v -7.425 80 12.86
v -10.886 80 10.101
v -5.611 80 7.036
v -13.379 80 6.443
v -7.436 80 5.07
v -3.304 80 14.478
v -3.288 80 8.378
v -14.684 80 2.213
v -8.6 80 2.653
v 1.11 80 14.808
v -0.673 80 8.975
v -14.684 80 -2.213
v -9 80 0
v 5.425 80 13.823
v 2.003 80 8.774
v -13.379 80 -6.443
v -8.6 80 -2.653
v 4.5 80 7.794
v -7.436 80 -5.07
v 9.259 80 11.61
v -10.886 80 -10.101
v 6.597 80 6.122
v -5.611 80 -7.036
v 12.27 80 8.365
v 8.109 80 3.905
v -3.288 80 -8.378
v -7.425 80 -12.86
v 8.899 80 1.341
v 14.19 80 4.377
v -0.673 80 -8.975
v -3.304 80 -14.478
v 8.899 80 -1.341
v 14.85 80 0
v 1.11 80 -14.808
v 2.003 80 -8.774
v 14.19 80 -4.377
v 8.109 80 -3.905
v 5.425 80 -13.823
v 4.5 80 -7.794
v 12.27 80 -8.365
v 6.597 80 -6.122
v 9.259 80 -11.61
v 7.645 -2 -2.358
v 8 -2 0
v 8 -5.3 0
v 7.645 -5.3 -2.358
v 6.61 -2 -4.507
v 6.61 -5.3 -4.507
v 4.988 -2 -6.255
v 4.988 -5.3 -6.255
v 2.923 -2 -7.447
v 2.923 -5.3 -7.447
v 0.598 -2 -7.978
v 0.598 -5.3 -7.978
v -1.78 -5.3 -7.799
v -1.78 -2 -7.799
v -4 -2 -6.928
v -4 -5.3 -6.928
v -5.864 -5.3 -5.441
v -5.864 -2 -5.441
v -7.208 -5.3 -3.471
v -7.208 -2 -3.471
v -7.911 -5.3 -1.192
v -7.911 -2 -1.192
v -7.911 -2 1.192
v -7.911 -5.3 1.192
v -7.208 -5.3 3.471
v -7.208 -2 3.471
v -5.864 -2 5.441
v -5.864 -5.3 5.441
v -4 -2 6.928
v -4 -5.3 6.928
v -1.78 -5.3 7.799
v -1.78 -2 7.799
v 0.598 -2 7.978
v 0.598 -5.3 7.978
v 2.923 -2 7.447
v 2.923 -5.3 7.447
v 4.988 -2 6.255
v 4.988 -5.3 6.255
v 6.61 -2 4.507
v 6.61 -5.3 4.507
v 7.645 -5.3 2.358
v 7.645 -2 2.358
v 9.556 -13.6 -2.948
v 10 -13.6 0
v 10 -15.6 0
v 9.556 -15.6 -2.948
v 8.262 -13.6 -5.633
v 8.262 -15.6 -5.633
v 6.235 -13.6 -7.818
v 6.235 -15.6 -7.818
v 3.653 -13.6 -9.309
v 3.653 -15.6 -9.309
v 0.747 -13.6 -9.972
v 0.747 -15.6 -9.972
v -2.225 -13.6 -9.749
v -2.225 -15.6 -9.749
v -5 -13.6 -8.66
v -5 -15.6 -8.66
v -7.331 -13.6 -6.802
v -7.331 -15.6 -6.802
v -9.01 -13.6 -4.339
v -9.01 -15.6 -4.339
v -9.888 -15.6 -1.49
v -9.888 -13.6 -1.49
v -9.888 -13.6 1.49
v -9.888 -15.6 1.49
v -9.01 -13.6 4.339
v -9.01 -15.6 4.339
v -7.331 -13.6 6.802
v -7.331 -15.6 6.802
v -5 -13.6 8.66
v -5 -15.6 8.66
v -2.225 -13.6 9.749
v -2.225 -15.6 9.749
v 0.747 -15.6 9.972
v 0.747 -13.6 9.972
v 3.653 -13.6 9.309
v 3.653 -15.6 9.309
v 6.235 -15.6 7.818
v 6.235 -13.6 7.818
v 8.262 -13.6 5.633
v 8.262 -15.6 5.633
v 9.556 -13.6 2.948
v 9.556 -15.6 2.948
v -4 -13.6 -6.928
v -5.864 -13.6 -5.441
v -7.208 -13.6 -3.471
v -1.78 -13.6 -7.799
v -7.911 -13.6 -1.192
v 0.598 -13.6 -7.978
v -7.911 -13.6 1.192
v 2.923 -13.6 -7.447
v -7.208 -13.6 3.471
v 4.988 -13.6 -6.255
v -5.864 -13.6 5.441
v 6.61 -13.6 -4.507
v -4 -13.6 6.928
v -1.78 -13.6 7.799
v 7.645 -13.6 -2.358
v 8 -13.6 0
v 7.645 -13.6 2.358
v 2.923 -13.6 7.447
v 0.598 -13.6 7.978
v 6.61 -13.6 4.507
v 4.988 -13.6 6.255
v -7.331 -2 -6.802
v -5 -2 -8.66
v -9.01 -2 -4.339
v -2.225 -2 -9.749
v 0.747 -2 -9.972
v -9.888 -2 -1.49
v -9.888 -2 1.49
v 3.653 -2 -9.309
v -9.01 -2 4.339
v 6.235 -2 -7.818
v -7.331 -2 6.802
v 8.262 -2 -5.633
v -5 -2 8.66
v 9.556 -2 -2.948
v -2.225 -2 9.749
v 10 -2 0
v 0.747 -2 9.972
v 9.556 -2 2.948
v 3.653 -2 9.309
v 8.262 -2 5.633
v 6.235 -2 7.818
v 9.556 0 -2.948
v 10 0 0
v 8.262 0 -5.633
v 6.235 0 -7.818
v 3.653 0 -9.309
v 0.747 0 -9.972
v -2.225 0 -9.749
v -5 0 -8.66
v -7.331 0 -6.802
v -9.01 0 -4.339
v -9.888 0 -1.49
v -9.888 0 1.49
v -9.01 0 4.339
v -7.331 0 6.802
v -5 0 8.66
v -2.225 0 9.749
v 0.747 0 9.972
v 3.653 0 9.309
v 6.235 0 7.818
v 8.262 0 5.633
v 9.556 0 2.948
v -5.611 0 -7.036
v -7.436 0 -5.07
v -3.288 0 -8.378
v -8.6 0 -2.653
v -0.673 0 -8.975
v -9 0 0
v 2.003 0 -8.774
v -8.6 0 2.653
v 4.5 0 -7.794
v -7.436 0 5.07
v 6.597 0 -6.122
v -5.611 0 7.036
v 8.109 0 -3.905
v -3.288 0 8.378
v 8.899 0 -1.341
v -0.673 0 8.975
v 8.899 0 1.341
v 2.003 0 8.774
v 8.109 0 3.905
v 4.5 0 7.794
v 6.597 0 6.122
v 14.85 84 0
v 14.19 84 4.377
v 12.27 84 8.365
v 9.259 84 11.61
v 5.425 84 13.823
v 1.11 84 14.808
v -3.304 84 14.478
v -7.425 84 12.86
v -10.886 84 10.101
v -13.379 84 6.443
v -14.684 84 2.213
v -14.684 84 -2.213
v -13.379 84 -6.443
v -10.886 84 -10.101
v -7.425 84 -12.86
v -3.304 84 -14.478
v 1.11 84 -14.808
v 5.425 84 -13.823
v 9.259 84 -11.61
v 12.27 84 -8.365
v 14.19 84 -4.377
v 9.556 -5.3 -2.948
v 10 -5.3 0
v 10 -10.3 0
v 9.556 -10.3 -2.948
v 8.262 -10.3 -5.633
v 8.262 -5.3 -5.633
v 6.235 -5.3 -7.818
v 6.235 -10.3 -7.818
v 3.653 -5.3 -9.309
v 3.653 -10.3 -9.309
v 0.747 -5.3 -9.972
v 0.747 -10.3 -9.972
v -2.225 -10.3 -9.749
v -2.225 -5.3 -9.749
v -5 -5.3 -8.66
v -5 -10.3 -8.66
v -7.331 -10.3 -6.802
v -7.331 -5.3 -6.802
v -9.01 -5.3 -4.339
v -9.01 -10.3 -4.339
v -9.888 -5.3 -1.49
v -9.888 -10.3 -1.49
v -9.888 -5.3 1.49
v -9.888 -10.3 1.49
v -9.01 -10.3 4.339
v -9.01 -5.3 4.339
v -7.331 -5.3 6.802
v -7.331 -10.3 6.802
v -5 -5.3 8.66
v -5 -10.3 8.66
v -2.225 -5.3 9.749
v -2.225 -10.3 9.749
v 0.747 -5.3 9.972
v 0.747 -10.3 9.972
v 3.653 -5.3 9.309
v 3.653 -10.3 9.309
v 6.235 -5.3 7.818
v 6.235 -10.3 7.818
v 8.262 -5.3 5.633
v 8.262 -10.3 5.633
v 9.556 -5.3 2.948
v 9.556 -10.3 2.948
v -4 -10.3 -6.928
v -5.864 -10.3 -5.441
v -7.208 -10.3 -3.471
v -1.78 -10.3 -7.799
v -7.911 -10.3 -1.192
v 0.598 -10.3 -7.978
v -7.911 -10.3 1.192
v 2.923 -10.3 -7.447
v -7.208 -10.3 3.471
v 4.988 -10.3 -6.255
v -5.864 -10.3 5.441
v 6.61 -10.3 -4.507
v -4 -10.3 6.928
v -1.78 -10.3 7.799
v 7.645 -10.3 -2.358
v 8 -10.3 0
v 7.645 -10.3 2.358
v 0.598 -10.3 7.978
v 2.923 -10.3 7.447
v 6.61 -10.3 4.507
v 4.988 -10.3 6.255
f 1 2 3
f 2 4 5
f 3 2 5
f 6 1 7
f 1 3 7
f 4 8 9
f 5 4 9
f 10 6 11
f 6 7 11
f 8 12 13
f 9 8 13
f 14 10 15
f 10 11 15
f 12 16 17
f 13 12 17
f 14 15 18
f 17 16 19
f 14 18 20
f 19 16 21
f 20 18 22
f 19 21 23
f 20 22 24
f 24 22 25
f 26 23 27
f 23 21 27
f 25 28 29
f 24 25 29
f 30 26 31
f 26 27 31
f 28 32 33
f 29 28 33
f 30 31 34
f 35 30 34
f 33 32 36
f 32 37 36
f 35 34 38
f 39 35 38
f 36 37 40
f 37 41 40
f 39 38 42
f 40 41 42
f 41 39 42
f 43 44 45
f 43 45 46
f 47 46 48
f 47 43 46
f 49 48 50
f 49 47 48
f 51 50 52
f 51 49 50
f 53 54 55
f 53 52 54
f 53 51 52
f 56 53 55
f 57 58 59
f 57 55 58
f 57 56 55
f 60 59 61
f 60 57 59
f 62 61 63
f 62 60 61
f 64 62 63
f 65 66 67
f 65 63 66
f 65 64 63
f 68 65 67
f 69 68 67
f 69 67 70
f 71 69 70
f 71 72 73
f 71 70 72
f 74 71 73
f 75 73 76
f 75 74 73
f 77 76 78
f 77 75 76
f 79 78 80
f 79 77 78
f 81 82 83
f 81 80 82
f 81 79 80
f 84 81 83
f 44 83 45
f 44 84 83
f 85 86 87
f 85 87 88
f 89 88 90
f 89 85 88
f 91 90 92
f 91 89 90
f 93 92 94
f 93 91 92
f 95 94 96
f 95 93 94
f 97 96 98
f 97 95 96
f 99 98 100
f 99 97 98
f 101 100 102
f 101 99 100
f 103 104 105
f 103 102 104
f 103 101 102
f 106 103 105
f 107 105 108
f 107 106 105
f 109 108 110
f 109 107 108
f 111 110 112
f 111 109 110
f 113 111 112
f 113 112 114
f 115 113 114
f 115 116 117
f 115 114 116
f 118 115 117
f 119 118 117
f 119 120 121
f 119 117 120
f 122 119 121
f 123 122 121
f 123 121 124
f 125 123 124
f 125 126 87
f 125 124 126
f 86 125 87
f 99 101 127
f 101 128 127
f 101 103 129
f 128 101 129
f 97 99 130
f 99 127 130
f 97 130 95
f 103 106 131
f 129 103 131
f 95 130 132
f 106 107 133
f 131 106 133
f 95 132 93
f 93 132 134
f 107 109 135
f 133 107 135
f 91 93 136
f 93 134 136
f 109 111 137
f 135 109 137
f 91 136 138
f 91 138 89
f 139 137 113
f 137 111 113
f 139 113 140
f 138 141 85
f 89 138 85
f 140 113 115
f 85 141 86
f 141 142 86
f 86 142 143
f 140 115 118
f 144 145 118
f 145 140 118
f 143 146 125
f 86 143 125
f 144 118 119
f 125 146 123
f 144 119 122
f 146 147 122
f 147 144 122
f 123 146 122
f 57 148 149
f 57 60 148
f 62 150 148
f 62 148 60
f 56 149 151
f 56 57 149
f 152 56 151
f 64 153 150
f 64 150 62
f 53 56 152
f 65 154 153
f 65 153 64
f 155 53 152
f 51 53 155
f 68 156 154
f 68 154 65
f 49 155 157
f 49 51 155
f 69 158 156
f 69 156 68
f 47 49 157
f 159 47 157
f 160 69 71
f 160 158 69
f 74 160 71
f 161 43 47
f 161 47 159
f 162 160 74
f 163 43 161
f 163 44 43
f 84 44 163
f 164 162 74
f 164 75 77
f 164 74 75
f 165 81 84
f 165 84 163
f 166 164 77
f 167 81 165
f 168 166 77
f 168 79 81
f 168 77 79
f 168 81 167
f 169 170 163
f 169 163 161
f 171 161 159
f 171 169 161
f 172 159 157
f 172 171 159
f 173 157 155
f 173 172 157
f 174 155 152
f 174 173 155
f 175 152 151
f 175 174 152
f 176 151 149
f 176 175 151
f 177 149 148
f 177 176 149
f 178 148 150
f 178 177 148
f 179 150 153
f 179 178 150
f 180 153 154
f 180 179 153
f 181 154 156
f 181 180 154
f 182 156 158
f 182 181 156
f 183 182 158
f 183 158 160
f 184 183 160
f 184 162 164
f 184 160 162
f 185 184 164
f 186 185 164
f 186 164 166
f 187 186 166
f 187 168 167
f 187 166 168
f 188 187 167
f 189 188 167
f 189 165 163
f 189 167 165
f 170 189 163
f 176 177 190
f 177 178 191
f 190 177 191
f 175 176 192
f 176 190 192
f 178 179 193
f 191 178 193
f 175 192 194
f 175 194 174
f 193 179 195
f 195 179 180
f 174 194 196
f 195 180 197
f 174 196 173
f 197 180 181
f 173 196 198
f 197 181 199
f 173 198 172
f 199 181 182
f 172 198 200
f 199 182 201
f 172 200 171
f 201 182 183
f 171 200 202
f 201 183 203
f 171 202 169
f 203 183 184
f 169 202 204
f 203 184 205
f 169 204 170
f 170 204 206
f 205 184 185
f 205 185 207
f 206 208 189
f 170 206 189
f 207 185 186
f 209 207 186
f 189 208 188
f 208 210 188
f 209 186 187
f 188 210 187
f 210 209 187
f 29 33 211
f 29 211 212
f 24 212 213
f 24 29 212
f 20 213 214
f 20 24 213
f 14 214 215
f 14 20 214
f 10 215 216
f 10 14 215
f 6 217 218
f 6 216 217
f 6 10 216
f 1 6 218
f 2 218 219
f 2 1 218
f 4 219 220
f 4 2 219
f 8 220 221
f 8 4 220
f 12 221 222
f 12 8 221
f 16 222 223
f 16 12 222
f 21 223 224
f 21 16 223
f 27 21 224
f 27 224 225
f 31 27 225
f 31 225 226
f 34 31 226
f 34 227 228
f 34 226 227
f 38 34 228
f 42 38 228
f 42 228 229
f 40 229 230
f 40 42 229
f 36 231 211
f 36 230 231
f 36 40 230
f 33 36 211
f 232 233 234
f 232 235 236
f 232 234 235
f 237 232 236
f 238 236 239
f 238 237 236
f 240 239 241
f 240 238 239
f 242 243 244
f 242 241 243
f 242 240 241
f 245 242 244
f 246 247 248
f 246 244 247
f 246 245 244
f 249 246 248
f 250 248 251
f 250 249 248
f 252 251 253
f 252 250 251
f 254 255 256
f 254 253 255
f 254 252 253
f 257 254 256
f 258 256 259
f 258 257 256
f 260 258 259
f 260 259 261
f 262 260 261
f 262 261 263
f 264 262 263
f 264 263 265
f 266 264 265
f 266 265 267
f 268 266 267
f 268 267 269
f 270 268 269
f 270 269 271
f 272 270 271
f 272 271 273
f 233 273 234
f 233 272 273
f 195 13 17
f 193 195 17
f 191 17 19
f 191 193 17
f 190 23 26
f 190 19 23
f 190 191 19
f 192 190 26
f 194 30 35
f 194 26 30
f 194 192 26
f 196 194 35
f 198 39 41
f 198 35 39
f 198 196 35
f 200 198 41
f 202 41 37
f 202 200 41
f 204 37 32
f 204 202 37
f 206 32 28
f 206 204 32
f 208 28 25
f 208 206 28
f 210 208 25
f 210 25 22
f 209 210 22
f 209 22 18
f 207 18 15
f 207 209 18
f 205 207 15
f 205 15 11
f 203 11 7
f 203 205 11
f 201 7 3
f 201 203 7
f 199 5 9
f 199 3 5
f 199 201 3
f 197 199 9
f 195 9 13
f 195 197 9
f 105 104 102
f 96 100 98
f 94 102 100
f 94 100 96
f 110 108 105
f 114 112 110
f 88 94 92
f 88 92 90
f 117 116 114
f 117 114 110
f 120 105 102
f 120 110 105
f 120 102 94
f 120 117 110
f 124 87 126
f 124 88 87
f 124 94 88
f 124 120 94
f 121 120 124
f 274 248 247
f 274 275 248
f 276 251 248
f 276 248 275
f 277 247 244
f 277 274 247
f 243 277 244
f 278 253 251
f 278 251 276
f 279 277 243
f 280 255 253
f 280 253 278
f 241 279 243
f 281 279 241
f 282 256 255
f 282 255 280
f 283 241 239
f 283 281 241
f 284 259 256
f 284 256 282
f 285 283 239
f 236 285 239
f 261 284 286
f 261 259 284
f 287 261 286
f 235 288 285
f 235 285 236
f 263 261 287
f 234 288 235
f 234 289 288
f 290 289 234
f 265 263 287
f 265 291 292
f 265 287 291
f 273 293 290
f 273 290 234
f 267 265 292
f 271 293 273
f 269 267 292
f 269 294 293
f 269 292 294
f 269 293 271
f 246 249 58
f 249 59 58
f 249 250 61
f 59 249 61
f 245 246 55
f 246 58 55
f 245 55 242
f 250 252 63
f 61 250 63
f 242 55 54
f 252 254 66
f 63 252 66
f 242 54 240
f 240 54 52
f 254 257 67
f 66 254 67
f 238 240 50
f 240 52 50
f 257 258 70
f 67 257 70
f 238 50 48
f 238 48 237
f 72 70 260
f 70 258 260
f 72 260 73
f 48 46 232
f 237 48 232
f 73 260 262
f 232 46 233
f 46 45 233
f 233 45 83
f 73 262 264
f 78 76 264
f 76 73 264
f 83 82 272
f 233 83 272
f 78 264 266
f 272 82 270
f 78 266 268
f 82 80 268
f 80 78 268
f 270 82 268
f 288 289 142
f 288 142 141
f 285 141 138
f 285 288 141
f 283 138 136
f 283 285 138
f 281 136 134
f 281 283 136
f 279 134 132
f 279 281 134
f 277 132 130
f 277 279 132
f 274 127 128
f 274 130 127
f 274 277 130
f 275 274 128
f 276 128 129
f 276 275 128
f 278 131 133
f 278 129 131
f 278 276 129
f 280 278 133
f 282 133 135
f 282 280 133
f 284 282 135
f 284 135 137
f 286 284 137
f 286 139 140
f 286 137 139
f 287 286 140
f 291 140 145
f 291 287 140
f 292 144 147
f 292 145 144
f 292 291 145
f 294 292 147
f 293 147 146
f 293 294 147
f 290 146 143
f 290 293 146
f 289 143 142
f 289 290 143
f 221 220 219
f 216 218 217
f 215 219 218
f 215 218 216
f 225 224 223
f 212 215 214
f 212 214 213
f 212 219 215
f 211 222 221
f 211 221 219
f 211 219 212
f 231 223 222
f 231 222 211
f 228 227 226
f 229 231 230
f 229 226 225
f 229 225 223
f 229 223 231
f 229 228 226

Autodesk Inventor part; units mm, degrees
ref_plane "YZ Plane" through (0, 0, 0) normal (1, 0, 0) x (0, 1, 0)
ref_plane "XZ Plane" through (0, 0, 0) normal (0, 1, 0) x (-1, 0, 0)
ref_plane "XY Plane" through (0, 0, 0) normal (0, 0, 1) x (1, 0, 0)
sketch "Sketch1" plane through (0, 0, 0) normal (0, 1, 0) x (-1, 0, 0)
  circle A0 centre (0, 0) radius 9
  dimension "d0" = 18
extrude "Extrusion1" add sketch "Sketch1" along normal blind 80
sketch "Sketch2" plane through (0, 80, 0) normal (0, 1, 0) x (1, 0, 0)
  circle A0 centre (0, 0) radius 14.85
  dimension "d3" = 29.7
extrude "Extrusion2" add sketch "Sketch2" along normal blind 4
sketch "Sketch3" plane through (0, 0, 0) normal (0, -1, 0) x (1, 0, 0)
  circle A0 centre (0, 0) radius 9 projected
  circle A1 centre (0, 0) radius 10
  dimension "d6" = 20
extrude "Extrusion3" add sketch "Sketch3" along normal blind 2 contours A0 | A1
sketch "Sketch4" plane through (0, -2, 0) normal (0, -1, 0) x (1, 0, 0)
  circle A0 centre (0, 0) radius 8
  dimension "d9" = 16
extrude "Extrusion4" add sketch "Sketch4" along normal blind 3.3
sketch "Sketch5" plane through (0, -5.3, 0) normal (0, -1, 0) x (1, 0, 0)
  circle A0 centre (0, 0) radius 10
  dimension "d12" = 20
extrude "Extrusion5" add sketch "Sketch5" along normal blind 5
sketch "Sketch7" plane through (0, -10.3, 0) normal (0, -1, 0) x (1, 0, 0)
  circle A0 centre (0, 0) radius 8
  dimension "d15" = 16
extrude "Extrusion6" add sketch "Sketch7" along normal blind 3.3
sketch "Sketch8" plane through (0, -13.6, 0) normal (0, -1, 0) x (1, 0, 0)
  circle A0 centre (0, 0) radius 10
  dimension "d18" = 20
extrude "Extrusion7" add sketch "Sketch8" along normal blind 2
properties part number "Plunger"
